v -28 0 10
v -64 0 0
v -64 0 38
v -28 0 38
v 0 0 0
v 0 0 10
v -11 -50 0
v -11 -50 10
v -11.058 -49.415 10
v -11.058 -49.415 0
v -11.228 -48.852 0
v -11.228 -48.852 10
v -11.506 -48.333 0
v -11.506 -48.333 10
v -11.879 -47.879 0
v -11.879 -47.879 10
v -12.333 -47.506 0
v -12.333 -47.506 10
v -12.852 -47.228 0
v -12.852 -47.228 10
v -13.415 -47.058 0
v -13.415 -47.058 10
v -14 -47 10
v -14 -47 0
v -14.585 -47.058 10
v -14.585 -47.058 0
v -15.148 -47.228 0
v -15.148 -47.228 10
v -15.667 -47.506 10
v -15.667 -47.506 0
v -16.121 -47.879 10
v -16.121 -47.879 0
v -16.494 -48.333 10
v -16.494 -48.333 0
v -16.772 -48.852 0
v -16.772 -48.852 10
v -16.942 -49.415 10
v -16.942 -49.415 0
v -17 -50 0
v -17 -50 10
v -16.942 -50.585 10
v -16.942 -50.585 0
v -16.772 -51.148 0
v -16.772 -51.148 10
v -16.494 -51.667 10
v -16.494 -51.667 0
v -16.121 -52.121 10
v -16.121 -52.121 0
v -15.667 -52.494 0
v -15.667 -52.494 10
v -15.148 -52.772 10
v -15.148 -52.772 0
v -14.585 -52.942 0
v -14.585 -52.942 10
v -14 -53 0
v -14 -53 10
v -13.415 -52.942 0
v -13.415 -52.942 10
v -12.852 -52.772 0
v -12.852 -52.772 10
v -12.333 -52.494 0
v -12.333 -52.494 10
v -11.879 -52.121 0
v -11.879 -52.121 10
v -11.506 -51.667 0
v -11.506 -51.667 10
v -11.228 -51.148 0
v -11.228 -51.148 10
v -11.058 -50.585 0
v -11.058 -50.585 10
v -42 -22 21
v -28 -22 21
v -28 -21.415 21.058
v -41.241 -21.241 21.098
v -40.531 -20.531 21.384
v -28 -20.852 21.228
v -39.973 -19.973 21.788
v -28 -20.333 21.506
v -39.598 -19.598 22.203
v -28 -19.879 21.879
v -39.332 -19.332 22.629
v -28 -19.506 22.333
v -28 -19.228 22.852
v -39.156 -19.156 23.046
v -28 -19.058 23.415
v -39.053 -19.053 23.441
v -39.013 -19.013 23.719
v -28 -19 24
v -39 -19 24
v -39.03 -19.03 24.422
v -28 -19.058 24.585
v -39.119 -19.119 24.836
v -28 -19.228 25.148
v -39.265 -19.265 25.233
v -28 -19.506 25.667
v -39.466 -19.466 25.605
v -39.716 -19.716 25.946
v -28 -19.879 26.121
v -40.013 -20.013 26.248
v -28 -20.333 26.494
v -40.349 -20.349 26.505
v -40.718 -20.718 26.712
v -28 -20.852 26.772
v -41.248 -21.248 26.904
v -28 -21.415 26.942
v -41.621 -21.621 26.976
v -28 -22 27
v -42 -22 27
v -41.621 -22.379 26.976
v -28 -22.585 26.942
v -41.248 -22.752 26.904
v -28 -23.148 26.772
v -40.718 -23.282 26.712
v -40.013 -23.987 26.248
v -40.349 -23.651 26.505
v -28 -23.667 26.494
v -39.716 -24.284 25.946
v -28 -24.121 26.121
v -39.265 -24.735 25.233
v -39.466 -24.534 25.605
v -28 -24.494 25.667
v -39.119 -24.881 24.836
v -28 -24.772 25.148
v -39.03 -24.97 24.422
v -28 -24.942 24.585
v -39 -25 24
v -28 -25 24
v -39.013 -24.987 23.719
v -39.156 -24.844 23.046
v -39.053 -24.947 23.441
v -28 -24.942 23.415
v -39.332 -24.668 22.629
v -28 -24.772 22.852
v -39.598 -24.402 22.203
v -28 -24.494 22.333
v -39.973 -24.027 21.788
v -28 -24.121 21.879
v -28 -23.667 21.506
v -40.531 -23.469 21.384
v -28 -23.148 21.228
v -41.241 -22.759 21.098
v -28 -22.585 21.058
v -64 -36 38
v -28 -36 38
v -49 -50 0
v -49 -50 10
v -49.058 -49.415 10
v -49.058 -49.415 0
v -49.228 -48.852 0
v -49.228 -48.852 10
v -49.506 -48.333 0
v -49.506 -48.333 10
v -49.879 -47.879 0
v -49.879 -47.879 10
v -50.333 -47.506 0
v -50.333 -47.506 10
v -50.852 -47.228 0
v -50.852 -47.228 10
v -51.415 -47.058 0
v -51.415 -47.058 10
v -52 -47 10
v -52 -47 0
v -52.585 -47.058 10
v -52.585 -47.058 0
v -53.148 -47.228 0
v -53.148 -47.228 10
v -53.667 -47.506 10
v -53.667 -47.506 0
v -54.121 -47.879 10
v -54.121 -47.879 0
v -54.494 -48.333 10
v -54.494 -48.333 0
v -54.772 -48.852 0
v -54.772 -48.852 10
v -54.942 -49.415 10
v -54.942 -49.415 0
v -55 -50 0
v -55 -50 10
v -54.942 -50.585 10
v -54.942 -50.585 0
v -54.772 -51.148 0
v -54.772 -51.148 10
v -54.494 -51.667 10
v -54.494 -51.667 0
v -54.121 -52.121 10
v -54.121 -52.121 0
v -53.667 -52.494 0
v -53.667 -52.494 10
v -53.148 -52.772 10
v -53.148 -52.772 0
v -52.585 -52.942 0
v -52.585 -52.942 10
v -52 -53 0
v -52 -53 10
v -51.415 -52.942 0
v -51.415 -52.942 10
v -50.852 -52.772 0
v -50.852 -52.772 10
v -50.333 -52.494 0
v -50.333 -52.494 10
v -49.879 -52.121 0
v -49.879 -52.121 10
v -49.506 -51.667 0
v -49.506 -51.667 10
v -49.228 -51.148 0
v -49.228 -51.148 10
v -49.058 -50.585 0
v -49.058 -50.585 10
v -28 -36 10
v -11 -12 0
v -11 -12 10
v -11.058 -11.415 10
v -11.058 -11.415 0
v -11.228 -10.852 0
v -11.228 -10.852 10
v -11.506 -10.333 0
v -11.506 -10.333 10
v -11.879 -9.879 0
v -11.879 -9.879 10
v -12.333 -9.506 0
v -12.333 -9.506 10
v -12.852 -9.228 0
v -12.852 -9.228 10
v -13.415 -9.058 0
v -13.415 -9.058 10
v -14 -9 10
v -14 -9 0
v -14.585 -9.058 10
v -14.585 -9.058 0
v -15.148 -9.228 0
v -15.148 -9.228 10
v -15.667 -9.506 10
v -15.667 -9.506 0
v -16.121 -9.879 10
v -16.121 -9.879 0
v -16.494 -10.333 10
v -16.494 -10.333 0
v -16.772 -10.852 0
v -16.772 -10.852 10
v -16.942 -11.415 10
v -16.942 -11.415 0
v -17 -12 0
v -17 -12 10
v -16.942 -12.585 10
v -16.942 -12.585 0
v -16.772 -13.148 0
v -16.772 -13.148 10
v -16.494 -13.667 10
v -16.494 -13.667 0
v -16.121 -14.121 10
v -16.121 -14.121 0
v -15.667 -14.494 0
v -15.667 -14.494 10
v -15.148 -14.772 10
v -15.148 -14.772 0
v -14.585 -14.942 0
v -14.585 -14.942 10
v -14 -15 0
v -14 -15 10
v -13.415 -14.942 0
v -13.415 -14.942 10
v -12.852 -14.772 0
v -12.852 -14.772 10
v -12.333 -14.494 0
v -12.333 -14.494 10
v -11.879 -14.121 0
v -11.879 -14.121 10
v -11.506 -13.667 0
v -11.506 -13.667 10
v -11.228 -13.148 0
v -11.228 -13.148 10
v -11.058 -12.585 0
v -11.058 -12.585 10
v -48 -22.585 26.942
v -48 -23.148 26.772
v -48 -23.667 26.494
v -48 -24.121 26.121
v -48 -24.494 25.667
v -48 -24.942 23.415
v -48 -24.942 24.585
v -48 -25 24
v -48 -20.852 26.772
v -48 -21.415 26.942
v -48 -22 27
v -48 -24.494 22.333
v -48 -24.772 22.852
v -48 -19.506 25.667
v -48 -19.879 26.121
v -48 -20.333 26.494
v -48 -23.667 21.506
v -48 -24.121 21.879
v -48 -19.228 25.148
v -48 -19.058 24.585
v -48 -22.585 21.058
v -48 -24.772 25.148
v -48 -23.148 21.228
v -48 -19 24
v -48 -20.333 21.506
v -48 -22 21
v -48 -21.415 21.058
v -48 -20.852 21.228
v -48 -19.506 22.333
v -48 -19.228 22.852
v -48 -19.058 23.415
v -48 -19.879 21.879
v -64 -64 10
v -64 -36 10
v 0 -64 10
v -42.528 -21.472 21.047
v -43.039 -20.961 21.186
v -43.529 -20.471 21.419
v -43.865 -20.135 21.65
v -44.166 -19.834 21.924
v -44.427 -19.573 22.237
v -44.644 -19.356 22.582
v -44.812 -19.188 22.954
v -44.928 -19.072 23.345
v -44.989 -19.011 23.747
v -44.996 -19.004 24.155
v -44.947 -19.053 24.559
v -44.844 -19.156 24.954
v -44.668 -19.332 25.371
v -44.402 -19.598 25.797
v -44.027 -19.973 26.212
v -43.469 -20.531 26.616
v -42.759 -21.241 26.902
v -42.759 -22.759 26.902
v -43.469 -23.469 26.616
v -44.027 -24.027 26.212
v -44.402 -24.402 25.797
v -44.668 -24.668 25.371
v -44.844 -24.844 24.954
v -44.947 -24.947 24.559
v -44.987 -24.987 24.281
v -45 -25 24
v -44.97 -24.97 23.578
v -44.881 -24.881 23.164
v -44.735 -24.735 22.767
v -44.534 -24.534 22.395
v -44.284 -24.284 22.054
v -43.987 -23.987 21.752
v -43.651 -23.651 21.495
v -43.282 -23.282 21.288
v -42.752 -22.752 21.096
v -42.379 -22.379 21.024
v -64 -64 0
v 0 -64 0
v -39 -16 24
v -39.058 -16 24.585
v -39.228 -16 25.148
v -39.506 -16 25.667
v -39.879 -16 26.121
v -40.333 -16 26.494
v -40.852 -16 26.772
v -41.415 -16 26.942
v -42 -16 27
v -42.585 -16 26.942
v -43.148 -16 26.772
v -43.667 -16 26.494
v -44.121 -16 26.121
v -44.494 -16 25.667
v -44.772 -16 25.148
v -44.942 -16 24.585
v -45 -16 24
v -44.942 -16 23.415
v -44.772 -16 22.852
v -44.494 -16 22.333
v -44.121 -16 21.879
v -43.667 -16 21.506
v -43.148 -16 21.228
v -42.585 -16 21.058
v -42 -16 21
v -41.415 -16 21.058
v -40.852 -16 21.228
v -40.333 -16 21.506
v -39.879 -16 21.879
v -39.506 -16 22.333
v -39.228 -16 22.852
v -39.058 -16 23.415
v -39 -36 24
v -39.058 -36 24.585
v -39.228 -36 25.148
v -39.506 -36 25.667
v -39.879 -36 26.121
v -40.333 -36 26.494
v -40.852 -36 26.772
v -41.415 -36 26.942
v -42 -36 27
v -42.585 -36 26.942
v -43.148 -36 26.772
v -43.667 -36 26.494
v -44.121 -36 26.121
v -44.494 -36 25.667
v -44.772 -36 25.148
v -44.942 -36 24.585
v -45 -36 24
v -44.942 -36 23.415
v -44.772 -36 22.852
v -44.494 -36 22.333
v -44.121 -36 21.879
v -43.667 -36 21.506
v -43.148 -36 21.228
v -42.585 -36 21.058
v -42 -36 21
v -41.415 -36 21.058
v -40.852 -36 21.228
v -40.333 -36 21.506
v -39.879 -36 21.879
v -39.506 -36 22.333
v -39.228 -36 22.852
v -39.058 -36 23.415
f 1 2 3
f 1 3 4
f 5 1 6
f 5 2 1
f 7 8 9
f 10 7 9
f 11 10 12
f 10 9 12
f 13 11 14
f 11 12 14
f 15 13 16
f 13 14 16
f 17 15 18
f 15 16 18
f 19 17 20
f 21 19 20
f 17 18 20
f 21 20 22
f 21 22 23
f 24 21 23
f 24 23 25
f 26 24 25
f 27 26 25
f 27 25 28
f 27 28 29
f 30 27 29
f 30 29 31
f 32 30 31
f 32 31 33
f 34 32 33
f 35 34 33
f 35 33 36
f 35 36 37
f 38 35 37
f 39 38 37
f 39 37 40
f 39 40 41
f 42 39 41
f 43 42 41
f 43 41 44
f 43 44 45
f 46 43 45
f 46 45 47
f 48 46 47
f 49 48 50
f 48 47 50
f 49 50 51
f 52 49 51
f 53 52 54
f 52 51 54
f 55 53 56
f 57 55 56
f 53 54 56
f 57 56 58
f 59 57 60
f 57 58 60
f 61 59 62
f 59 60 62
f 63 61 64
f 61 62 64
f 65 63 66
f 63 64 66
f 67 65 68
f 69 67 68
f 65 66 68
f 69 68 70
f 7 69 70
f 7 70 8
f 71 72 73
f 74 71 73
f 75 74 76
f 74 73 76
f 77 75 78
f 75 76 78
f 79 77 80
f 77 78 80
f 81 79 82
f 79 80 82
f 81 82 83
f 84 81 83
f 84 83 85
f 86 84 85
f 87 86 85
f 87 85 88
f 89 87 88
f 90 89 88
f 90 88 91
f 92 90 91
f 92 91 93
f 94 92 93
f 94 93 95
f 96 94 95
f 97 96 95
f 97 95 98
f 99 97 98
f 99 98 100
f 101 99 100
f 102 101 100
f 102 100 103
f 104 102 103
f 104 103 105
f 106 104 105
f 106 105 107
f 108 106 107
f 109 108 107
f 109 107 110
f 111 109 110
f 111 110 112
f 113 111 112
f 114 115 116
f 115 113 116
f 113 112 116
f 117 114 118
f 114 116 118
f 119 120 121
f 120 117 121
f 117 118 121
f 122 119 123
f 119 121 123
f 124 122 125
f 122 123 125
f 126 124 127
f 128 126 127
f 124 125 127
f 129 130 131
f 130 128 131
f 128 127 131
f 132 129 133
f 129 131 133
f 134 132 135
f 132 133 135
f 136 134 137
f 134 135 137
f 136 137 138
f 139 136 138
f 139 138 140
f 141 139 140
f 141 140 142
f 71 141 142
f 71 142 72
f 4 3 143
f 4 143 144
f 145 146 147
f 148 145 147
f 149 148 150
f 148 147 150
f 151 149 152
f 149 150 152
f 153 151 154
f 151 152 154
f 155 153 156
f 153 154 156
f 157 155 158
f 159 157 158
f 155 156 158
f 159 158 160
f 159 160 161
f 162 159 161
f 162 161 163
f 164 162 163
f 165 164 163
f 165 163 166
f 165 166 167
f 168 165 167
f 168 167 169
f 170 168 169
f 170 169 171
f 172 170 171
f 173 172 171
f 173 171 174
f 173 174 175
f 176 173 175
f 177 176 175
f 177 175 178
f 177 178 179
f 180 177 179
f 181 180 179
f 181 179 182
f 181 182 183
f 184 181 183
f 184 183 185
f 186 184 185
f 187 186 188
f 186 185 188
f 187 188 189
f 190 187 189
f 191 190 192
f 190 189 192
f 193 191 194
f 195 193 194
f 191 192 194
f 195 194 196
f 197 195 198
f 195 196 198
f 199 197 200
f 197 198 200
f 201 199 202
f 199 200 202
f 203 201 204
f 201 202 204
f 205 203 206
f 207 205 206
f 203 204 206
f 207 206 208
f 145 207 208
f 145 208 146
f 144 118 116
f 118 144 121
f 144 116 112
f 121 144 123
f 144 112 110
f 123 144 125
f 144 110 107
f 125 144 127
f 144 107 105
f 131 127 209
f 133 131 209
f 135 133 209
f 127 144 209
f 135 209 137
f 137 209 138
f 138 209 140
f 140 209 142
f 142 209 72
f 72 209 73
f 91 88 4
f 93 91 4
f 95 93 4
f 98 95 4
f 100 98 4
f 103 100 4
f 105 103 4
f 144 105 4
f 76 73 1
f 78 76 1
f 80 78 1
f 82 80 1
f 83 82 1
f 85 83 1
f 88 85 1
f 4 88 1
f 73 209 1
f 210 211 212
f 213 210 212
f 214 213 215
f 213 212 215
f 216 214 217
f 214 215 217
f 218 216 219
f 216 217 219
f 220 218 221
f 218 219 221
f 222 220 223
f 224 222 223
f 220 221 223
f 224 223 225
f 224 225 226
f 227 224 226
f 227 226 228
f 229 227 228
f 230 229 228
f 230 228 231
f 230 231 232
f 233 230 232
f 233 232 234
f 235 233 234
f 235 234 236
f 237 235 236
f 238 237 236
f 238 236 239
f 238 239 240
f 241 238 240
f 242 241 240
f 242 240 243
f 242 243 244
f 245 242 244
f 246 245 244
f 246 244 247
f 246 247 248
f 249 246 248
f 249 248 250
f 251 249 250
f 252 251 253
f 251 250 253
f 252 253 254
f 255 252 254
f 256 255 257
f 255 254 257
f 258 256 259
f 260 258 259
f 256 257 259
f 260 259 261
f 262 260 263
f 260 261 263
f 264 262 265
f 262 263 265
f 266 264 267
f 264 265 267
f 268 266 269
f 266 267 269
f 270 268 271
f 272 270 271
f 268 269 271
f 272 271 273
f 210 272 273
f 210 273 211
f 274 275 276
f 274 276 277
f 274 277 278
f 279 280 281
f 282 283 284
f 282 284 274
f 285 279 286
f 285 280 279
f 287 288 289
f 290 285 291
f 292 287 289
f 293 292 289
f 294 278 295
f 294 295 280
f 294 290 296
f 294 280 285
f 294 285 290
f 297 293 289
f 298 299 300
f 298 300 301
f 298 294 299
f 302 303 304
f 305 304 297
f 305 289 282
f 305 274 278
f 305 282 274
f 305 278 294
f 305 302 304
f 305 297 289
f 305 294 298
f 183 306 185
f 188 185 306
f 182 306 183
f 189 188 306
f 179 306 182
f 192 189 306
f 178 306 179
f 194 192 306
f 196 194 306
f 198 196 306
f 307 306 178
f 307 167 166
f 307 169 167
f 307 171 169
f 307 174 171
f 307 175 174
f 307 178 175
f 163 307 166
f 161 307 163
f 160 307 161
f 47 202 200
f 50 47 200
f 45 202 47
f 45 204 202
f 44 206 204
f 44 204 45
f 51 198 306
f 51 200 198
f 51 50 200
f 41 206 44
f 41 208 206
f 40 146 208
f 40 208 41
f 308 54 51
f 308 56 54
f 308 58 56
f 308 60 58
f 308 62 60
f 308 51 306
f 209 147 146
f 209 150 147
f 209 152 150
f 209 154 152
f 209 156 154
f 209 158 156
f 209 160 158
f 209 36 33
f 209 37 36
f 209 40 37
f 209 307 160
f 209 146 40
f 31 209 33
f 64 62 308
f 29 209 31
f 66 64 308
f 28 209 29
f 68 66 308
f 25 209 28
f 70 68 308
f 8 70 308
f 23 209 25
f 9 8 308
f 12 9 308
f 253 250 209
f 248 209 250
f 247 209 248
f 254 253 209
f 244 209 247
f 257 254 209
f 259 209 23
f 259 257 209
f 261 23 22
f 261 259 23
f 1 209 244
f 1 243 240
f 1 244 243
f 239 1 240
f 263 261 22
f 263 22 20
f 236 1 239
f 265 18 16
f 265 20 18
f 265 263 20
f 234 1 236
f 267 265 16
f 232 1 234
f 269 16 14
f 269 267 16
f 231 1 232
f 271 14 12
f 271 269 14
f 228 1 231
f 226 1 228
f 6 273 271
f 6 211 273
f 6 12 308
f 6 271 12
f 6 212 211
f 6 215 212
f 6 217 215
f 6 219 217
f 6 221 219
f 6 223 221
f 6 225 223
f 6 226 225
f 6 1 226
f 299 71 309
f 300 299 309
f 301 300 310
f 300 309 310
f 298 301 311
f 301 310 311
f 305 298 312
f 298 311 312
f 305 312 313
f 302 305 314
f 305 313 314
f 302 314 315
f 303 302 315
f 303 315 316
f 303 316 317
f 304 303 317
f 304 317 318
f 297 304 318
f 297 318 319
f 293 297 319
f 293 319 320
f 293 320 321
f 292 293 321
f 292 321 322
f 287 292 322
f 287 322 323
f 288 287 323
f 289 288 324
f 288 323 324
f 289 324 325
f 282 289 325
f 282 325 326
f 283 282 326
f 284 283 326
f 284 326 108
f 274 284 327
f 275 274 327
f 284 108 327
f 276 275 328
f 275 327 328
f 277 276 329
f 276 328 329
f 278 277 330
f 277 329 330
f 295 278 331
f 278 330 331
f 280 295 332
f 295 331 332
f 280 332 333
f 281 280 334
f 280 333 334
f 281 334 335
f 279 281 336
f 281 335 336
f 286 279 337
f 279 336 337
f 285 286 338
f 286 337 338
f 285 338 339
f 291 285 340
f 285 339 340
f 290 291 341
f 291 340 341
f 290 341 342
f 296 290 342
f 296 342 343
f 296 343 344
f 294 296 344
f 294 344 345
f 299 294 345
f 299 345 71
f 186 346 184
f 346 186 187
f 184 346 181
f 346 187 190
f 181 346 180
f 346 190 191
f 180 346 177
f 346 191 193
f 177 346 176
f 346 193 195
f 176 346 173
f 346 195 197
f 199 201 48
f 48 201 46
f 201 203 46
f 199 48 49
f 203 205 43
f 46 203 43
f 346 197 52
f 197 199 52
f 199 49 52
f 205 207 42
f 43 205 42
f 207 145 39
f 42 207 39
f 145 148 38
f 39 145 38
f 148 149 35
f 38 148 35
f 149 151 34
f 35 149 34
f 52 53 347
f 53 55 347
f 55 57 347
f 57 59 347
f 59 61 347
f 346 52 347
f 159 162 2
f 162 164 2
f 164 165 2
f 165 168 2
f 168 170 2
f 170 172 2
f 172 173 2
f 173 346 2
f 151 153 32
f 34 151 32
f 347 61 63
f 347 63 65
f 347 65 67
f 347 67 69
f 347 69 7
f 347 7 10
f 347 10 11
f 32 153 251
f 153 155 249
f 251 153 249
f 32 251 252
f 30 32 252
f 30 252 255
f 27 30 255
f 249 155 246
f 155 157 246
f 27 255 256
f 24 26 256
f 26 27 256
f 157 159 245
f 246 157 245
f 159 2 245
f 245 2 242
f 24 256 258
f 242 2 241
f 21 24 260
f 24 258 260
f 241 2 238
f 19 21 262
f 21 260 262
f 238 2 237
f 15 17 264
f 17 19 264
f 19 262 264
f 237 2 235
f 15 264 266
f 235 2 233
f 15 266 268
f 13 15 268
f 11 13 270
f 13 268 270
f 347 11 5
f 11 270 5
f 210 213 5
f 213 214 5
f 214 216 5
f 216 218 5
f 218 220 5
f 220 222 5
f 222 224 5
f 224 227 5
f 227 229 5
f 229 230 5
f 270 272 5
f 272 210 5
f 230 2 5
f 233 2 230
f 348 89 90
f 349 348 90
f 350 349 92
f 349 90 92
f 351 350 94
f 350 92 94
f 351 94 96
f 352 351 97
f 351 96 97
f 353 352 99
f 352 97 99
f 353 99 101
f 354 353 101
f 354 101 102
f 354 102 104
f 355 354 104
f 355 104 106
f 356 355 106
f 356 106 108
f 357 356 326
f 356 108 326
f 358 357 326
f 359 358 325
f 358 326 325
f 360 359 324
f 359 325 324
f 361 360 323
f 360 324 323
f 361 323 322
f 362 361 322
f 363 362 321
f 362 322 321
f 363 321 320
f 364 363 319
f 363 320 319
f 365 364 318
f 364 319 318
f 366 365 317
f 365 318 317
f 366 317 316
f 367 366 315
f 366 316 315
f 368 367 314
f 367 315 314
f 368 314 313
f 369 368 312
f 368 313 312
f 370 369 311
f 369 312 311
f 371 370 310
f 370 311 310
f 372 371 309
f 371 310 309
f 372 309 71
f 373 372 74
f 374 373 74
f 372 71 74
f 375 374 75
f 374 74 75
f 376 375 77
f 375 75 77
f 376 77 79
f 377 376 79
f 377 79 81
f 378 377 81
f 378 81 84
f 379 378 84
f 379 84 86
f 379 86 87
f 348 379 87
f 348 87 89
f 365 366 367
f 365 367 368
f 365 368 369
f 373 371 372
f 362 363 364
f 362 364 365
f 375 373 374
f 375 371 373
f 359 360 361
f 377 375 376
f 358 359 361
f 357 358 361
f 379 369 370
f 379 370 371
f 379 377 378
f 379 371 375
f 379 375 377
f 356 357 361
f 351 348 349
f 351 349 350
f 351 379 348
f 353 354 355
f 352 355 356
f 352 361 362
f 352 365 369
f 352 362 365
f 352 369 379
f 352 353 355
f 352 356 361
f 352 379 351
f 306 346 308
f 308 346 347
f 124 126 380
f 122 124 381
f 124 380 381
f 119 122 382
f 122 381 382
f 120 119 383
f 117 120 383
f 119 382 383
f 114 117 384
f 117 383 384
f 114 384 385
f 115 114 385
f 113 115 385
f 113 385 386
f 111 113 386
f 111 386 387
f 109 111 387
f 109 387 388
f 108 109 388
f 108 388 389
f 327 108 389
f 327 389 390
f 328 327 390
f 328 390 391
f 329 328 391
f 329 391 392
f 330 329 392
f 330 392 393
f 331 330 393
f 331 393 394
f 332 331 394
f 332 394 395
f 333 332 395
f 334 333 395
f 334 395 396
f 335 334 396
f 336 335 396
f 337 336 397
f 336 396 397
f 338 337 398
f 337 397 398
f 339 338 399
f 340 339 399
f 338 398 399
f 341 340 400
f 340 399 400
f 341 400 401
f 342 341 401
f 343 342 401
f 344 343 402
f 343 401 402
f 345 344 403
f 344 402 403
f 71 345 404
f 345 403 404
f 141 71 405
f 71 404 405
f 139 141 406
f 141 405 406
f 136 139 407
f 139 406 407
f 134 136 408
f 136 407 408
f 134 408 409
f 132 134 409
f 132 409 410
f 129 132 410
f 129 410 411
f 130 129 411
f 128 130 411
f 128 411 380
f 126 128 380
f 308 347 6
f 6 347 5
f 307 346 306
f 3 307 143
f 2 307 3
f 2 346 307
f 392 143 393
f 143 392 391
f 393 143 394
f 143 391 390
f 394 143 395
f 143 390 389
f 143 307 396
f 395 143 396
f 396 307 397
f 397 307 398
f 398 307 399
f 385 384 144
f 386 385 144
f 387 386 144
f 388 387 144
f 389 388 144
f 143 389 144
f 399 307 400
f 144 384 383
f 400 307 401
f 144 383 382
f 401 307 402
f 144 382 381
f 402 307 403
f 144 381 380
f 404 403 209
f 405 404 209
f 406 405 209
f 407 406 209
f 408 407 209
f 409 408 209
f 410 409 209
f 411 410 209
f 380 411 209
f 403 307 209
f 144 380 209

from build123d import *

# Parameters (mm, degrees)
IZIM1_W                     = 64
IZIM1_H                     = 64
Y_KSEKLIK_EKSTR_ZYON1_DEPTH = 10
IZIM2_W                     = 36
IZIM2_H                     = 36
Y_KSEKLIK_EKSTR_ZYON2_DEPTH = 28
IZIM3_R                     = 3
KES_EKSTR_ZYON1_DEPTH       = 20
IZIM4_R                     = 3
KES_EKSTR_ZYON2_DEPTH       = 20
IZIM5_R                     = 3
KES_EKSTR_ZYON3_DEPTH       = 11


with BuildPart() as part:
    # Çizim1 → Yükseklik-Ekstrüzyon1 (new body)
    with BuildSketch(Plane.XY):
        with Locations((-32, -32)):
            Rectangle(IZIM1_W, IZIM1_H)
    extrude(amount=Y_KSEKLIK_EKSTR_ZYON1_DEPTH)

    # Çizim2 → Yükseklik-Ekstrüzyon2 (add)
    with BuildSketch(Plane.XY.offset(10)):
        with Locations((-46, -18)):
            Rectangle(IZIM2_W, IZIM2_H)
    extrude(amount=Y_KSEKLIK_EKSTR_ZYON2_DEPTH)

    # Çizim3 → Kes-Ekstrüzyon1 (cut)
    with BuildSketch(Plane.XZ.offset(36)):
        with Locations((-42, 24)):
            Circle(IZIM3_R)
    extrude(amount=-KES_EKSTR_ZYON1_DEPTH, mode=Mode.SUBTRACT)

    # Çizim4 → Kes-Ekstrüzyon2 (cut)
    with BuildSketch(Plane(origin=(-28, 0, 0), x_dir=(0, 0, -1), z_dir=(1, 0, 0))):
        with Locations((-24, -22)):
            Circle(IZIM4_R)
    extrude(amount=-KES_EKSTR_ZYON2_DEPTH, mode=Mode.SUBTRACT)

    # Çizim5 → Kes-Ekstrüzyon3 (cut, through all)
    with BuildSketch(Plane.XY.offset(10)):
        with Locations((-14, -50)):
            Circle(IZIM5_R)
        with Locations((-14, -12)):
            Circle(IZIM5_R)
        with Locations((-52, -50)):
            Circle(IZIM5_R)
    extrude(amount=-KES_EKSTR_ZYON3_DEPTH, mode=Mode.SUBTRACT)


solid = part.part
